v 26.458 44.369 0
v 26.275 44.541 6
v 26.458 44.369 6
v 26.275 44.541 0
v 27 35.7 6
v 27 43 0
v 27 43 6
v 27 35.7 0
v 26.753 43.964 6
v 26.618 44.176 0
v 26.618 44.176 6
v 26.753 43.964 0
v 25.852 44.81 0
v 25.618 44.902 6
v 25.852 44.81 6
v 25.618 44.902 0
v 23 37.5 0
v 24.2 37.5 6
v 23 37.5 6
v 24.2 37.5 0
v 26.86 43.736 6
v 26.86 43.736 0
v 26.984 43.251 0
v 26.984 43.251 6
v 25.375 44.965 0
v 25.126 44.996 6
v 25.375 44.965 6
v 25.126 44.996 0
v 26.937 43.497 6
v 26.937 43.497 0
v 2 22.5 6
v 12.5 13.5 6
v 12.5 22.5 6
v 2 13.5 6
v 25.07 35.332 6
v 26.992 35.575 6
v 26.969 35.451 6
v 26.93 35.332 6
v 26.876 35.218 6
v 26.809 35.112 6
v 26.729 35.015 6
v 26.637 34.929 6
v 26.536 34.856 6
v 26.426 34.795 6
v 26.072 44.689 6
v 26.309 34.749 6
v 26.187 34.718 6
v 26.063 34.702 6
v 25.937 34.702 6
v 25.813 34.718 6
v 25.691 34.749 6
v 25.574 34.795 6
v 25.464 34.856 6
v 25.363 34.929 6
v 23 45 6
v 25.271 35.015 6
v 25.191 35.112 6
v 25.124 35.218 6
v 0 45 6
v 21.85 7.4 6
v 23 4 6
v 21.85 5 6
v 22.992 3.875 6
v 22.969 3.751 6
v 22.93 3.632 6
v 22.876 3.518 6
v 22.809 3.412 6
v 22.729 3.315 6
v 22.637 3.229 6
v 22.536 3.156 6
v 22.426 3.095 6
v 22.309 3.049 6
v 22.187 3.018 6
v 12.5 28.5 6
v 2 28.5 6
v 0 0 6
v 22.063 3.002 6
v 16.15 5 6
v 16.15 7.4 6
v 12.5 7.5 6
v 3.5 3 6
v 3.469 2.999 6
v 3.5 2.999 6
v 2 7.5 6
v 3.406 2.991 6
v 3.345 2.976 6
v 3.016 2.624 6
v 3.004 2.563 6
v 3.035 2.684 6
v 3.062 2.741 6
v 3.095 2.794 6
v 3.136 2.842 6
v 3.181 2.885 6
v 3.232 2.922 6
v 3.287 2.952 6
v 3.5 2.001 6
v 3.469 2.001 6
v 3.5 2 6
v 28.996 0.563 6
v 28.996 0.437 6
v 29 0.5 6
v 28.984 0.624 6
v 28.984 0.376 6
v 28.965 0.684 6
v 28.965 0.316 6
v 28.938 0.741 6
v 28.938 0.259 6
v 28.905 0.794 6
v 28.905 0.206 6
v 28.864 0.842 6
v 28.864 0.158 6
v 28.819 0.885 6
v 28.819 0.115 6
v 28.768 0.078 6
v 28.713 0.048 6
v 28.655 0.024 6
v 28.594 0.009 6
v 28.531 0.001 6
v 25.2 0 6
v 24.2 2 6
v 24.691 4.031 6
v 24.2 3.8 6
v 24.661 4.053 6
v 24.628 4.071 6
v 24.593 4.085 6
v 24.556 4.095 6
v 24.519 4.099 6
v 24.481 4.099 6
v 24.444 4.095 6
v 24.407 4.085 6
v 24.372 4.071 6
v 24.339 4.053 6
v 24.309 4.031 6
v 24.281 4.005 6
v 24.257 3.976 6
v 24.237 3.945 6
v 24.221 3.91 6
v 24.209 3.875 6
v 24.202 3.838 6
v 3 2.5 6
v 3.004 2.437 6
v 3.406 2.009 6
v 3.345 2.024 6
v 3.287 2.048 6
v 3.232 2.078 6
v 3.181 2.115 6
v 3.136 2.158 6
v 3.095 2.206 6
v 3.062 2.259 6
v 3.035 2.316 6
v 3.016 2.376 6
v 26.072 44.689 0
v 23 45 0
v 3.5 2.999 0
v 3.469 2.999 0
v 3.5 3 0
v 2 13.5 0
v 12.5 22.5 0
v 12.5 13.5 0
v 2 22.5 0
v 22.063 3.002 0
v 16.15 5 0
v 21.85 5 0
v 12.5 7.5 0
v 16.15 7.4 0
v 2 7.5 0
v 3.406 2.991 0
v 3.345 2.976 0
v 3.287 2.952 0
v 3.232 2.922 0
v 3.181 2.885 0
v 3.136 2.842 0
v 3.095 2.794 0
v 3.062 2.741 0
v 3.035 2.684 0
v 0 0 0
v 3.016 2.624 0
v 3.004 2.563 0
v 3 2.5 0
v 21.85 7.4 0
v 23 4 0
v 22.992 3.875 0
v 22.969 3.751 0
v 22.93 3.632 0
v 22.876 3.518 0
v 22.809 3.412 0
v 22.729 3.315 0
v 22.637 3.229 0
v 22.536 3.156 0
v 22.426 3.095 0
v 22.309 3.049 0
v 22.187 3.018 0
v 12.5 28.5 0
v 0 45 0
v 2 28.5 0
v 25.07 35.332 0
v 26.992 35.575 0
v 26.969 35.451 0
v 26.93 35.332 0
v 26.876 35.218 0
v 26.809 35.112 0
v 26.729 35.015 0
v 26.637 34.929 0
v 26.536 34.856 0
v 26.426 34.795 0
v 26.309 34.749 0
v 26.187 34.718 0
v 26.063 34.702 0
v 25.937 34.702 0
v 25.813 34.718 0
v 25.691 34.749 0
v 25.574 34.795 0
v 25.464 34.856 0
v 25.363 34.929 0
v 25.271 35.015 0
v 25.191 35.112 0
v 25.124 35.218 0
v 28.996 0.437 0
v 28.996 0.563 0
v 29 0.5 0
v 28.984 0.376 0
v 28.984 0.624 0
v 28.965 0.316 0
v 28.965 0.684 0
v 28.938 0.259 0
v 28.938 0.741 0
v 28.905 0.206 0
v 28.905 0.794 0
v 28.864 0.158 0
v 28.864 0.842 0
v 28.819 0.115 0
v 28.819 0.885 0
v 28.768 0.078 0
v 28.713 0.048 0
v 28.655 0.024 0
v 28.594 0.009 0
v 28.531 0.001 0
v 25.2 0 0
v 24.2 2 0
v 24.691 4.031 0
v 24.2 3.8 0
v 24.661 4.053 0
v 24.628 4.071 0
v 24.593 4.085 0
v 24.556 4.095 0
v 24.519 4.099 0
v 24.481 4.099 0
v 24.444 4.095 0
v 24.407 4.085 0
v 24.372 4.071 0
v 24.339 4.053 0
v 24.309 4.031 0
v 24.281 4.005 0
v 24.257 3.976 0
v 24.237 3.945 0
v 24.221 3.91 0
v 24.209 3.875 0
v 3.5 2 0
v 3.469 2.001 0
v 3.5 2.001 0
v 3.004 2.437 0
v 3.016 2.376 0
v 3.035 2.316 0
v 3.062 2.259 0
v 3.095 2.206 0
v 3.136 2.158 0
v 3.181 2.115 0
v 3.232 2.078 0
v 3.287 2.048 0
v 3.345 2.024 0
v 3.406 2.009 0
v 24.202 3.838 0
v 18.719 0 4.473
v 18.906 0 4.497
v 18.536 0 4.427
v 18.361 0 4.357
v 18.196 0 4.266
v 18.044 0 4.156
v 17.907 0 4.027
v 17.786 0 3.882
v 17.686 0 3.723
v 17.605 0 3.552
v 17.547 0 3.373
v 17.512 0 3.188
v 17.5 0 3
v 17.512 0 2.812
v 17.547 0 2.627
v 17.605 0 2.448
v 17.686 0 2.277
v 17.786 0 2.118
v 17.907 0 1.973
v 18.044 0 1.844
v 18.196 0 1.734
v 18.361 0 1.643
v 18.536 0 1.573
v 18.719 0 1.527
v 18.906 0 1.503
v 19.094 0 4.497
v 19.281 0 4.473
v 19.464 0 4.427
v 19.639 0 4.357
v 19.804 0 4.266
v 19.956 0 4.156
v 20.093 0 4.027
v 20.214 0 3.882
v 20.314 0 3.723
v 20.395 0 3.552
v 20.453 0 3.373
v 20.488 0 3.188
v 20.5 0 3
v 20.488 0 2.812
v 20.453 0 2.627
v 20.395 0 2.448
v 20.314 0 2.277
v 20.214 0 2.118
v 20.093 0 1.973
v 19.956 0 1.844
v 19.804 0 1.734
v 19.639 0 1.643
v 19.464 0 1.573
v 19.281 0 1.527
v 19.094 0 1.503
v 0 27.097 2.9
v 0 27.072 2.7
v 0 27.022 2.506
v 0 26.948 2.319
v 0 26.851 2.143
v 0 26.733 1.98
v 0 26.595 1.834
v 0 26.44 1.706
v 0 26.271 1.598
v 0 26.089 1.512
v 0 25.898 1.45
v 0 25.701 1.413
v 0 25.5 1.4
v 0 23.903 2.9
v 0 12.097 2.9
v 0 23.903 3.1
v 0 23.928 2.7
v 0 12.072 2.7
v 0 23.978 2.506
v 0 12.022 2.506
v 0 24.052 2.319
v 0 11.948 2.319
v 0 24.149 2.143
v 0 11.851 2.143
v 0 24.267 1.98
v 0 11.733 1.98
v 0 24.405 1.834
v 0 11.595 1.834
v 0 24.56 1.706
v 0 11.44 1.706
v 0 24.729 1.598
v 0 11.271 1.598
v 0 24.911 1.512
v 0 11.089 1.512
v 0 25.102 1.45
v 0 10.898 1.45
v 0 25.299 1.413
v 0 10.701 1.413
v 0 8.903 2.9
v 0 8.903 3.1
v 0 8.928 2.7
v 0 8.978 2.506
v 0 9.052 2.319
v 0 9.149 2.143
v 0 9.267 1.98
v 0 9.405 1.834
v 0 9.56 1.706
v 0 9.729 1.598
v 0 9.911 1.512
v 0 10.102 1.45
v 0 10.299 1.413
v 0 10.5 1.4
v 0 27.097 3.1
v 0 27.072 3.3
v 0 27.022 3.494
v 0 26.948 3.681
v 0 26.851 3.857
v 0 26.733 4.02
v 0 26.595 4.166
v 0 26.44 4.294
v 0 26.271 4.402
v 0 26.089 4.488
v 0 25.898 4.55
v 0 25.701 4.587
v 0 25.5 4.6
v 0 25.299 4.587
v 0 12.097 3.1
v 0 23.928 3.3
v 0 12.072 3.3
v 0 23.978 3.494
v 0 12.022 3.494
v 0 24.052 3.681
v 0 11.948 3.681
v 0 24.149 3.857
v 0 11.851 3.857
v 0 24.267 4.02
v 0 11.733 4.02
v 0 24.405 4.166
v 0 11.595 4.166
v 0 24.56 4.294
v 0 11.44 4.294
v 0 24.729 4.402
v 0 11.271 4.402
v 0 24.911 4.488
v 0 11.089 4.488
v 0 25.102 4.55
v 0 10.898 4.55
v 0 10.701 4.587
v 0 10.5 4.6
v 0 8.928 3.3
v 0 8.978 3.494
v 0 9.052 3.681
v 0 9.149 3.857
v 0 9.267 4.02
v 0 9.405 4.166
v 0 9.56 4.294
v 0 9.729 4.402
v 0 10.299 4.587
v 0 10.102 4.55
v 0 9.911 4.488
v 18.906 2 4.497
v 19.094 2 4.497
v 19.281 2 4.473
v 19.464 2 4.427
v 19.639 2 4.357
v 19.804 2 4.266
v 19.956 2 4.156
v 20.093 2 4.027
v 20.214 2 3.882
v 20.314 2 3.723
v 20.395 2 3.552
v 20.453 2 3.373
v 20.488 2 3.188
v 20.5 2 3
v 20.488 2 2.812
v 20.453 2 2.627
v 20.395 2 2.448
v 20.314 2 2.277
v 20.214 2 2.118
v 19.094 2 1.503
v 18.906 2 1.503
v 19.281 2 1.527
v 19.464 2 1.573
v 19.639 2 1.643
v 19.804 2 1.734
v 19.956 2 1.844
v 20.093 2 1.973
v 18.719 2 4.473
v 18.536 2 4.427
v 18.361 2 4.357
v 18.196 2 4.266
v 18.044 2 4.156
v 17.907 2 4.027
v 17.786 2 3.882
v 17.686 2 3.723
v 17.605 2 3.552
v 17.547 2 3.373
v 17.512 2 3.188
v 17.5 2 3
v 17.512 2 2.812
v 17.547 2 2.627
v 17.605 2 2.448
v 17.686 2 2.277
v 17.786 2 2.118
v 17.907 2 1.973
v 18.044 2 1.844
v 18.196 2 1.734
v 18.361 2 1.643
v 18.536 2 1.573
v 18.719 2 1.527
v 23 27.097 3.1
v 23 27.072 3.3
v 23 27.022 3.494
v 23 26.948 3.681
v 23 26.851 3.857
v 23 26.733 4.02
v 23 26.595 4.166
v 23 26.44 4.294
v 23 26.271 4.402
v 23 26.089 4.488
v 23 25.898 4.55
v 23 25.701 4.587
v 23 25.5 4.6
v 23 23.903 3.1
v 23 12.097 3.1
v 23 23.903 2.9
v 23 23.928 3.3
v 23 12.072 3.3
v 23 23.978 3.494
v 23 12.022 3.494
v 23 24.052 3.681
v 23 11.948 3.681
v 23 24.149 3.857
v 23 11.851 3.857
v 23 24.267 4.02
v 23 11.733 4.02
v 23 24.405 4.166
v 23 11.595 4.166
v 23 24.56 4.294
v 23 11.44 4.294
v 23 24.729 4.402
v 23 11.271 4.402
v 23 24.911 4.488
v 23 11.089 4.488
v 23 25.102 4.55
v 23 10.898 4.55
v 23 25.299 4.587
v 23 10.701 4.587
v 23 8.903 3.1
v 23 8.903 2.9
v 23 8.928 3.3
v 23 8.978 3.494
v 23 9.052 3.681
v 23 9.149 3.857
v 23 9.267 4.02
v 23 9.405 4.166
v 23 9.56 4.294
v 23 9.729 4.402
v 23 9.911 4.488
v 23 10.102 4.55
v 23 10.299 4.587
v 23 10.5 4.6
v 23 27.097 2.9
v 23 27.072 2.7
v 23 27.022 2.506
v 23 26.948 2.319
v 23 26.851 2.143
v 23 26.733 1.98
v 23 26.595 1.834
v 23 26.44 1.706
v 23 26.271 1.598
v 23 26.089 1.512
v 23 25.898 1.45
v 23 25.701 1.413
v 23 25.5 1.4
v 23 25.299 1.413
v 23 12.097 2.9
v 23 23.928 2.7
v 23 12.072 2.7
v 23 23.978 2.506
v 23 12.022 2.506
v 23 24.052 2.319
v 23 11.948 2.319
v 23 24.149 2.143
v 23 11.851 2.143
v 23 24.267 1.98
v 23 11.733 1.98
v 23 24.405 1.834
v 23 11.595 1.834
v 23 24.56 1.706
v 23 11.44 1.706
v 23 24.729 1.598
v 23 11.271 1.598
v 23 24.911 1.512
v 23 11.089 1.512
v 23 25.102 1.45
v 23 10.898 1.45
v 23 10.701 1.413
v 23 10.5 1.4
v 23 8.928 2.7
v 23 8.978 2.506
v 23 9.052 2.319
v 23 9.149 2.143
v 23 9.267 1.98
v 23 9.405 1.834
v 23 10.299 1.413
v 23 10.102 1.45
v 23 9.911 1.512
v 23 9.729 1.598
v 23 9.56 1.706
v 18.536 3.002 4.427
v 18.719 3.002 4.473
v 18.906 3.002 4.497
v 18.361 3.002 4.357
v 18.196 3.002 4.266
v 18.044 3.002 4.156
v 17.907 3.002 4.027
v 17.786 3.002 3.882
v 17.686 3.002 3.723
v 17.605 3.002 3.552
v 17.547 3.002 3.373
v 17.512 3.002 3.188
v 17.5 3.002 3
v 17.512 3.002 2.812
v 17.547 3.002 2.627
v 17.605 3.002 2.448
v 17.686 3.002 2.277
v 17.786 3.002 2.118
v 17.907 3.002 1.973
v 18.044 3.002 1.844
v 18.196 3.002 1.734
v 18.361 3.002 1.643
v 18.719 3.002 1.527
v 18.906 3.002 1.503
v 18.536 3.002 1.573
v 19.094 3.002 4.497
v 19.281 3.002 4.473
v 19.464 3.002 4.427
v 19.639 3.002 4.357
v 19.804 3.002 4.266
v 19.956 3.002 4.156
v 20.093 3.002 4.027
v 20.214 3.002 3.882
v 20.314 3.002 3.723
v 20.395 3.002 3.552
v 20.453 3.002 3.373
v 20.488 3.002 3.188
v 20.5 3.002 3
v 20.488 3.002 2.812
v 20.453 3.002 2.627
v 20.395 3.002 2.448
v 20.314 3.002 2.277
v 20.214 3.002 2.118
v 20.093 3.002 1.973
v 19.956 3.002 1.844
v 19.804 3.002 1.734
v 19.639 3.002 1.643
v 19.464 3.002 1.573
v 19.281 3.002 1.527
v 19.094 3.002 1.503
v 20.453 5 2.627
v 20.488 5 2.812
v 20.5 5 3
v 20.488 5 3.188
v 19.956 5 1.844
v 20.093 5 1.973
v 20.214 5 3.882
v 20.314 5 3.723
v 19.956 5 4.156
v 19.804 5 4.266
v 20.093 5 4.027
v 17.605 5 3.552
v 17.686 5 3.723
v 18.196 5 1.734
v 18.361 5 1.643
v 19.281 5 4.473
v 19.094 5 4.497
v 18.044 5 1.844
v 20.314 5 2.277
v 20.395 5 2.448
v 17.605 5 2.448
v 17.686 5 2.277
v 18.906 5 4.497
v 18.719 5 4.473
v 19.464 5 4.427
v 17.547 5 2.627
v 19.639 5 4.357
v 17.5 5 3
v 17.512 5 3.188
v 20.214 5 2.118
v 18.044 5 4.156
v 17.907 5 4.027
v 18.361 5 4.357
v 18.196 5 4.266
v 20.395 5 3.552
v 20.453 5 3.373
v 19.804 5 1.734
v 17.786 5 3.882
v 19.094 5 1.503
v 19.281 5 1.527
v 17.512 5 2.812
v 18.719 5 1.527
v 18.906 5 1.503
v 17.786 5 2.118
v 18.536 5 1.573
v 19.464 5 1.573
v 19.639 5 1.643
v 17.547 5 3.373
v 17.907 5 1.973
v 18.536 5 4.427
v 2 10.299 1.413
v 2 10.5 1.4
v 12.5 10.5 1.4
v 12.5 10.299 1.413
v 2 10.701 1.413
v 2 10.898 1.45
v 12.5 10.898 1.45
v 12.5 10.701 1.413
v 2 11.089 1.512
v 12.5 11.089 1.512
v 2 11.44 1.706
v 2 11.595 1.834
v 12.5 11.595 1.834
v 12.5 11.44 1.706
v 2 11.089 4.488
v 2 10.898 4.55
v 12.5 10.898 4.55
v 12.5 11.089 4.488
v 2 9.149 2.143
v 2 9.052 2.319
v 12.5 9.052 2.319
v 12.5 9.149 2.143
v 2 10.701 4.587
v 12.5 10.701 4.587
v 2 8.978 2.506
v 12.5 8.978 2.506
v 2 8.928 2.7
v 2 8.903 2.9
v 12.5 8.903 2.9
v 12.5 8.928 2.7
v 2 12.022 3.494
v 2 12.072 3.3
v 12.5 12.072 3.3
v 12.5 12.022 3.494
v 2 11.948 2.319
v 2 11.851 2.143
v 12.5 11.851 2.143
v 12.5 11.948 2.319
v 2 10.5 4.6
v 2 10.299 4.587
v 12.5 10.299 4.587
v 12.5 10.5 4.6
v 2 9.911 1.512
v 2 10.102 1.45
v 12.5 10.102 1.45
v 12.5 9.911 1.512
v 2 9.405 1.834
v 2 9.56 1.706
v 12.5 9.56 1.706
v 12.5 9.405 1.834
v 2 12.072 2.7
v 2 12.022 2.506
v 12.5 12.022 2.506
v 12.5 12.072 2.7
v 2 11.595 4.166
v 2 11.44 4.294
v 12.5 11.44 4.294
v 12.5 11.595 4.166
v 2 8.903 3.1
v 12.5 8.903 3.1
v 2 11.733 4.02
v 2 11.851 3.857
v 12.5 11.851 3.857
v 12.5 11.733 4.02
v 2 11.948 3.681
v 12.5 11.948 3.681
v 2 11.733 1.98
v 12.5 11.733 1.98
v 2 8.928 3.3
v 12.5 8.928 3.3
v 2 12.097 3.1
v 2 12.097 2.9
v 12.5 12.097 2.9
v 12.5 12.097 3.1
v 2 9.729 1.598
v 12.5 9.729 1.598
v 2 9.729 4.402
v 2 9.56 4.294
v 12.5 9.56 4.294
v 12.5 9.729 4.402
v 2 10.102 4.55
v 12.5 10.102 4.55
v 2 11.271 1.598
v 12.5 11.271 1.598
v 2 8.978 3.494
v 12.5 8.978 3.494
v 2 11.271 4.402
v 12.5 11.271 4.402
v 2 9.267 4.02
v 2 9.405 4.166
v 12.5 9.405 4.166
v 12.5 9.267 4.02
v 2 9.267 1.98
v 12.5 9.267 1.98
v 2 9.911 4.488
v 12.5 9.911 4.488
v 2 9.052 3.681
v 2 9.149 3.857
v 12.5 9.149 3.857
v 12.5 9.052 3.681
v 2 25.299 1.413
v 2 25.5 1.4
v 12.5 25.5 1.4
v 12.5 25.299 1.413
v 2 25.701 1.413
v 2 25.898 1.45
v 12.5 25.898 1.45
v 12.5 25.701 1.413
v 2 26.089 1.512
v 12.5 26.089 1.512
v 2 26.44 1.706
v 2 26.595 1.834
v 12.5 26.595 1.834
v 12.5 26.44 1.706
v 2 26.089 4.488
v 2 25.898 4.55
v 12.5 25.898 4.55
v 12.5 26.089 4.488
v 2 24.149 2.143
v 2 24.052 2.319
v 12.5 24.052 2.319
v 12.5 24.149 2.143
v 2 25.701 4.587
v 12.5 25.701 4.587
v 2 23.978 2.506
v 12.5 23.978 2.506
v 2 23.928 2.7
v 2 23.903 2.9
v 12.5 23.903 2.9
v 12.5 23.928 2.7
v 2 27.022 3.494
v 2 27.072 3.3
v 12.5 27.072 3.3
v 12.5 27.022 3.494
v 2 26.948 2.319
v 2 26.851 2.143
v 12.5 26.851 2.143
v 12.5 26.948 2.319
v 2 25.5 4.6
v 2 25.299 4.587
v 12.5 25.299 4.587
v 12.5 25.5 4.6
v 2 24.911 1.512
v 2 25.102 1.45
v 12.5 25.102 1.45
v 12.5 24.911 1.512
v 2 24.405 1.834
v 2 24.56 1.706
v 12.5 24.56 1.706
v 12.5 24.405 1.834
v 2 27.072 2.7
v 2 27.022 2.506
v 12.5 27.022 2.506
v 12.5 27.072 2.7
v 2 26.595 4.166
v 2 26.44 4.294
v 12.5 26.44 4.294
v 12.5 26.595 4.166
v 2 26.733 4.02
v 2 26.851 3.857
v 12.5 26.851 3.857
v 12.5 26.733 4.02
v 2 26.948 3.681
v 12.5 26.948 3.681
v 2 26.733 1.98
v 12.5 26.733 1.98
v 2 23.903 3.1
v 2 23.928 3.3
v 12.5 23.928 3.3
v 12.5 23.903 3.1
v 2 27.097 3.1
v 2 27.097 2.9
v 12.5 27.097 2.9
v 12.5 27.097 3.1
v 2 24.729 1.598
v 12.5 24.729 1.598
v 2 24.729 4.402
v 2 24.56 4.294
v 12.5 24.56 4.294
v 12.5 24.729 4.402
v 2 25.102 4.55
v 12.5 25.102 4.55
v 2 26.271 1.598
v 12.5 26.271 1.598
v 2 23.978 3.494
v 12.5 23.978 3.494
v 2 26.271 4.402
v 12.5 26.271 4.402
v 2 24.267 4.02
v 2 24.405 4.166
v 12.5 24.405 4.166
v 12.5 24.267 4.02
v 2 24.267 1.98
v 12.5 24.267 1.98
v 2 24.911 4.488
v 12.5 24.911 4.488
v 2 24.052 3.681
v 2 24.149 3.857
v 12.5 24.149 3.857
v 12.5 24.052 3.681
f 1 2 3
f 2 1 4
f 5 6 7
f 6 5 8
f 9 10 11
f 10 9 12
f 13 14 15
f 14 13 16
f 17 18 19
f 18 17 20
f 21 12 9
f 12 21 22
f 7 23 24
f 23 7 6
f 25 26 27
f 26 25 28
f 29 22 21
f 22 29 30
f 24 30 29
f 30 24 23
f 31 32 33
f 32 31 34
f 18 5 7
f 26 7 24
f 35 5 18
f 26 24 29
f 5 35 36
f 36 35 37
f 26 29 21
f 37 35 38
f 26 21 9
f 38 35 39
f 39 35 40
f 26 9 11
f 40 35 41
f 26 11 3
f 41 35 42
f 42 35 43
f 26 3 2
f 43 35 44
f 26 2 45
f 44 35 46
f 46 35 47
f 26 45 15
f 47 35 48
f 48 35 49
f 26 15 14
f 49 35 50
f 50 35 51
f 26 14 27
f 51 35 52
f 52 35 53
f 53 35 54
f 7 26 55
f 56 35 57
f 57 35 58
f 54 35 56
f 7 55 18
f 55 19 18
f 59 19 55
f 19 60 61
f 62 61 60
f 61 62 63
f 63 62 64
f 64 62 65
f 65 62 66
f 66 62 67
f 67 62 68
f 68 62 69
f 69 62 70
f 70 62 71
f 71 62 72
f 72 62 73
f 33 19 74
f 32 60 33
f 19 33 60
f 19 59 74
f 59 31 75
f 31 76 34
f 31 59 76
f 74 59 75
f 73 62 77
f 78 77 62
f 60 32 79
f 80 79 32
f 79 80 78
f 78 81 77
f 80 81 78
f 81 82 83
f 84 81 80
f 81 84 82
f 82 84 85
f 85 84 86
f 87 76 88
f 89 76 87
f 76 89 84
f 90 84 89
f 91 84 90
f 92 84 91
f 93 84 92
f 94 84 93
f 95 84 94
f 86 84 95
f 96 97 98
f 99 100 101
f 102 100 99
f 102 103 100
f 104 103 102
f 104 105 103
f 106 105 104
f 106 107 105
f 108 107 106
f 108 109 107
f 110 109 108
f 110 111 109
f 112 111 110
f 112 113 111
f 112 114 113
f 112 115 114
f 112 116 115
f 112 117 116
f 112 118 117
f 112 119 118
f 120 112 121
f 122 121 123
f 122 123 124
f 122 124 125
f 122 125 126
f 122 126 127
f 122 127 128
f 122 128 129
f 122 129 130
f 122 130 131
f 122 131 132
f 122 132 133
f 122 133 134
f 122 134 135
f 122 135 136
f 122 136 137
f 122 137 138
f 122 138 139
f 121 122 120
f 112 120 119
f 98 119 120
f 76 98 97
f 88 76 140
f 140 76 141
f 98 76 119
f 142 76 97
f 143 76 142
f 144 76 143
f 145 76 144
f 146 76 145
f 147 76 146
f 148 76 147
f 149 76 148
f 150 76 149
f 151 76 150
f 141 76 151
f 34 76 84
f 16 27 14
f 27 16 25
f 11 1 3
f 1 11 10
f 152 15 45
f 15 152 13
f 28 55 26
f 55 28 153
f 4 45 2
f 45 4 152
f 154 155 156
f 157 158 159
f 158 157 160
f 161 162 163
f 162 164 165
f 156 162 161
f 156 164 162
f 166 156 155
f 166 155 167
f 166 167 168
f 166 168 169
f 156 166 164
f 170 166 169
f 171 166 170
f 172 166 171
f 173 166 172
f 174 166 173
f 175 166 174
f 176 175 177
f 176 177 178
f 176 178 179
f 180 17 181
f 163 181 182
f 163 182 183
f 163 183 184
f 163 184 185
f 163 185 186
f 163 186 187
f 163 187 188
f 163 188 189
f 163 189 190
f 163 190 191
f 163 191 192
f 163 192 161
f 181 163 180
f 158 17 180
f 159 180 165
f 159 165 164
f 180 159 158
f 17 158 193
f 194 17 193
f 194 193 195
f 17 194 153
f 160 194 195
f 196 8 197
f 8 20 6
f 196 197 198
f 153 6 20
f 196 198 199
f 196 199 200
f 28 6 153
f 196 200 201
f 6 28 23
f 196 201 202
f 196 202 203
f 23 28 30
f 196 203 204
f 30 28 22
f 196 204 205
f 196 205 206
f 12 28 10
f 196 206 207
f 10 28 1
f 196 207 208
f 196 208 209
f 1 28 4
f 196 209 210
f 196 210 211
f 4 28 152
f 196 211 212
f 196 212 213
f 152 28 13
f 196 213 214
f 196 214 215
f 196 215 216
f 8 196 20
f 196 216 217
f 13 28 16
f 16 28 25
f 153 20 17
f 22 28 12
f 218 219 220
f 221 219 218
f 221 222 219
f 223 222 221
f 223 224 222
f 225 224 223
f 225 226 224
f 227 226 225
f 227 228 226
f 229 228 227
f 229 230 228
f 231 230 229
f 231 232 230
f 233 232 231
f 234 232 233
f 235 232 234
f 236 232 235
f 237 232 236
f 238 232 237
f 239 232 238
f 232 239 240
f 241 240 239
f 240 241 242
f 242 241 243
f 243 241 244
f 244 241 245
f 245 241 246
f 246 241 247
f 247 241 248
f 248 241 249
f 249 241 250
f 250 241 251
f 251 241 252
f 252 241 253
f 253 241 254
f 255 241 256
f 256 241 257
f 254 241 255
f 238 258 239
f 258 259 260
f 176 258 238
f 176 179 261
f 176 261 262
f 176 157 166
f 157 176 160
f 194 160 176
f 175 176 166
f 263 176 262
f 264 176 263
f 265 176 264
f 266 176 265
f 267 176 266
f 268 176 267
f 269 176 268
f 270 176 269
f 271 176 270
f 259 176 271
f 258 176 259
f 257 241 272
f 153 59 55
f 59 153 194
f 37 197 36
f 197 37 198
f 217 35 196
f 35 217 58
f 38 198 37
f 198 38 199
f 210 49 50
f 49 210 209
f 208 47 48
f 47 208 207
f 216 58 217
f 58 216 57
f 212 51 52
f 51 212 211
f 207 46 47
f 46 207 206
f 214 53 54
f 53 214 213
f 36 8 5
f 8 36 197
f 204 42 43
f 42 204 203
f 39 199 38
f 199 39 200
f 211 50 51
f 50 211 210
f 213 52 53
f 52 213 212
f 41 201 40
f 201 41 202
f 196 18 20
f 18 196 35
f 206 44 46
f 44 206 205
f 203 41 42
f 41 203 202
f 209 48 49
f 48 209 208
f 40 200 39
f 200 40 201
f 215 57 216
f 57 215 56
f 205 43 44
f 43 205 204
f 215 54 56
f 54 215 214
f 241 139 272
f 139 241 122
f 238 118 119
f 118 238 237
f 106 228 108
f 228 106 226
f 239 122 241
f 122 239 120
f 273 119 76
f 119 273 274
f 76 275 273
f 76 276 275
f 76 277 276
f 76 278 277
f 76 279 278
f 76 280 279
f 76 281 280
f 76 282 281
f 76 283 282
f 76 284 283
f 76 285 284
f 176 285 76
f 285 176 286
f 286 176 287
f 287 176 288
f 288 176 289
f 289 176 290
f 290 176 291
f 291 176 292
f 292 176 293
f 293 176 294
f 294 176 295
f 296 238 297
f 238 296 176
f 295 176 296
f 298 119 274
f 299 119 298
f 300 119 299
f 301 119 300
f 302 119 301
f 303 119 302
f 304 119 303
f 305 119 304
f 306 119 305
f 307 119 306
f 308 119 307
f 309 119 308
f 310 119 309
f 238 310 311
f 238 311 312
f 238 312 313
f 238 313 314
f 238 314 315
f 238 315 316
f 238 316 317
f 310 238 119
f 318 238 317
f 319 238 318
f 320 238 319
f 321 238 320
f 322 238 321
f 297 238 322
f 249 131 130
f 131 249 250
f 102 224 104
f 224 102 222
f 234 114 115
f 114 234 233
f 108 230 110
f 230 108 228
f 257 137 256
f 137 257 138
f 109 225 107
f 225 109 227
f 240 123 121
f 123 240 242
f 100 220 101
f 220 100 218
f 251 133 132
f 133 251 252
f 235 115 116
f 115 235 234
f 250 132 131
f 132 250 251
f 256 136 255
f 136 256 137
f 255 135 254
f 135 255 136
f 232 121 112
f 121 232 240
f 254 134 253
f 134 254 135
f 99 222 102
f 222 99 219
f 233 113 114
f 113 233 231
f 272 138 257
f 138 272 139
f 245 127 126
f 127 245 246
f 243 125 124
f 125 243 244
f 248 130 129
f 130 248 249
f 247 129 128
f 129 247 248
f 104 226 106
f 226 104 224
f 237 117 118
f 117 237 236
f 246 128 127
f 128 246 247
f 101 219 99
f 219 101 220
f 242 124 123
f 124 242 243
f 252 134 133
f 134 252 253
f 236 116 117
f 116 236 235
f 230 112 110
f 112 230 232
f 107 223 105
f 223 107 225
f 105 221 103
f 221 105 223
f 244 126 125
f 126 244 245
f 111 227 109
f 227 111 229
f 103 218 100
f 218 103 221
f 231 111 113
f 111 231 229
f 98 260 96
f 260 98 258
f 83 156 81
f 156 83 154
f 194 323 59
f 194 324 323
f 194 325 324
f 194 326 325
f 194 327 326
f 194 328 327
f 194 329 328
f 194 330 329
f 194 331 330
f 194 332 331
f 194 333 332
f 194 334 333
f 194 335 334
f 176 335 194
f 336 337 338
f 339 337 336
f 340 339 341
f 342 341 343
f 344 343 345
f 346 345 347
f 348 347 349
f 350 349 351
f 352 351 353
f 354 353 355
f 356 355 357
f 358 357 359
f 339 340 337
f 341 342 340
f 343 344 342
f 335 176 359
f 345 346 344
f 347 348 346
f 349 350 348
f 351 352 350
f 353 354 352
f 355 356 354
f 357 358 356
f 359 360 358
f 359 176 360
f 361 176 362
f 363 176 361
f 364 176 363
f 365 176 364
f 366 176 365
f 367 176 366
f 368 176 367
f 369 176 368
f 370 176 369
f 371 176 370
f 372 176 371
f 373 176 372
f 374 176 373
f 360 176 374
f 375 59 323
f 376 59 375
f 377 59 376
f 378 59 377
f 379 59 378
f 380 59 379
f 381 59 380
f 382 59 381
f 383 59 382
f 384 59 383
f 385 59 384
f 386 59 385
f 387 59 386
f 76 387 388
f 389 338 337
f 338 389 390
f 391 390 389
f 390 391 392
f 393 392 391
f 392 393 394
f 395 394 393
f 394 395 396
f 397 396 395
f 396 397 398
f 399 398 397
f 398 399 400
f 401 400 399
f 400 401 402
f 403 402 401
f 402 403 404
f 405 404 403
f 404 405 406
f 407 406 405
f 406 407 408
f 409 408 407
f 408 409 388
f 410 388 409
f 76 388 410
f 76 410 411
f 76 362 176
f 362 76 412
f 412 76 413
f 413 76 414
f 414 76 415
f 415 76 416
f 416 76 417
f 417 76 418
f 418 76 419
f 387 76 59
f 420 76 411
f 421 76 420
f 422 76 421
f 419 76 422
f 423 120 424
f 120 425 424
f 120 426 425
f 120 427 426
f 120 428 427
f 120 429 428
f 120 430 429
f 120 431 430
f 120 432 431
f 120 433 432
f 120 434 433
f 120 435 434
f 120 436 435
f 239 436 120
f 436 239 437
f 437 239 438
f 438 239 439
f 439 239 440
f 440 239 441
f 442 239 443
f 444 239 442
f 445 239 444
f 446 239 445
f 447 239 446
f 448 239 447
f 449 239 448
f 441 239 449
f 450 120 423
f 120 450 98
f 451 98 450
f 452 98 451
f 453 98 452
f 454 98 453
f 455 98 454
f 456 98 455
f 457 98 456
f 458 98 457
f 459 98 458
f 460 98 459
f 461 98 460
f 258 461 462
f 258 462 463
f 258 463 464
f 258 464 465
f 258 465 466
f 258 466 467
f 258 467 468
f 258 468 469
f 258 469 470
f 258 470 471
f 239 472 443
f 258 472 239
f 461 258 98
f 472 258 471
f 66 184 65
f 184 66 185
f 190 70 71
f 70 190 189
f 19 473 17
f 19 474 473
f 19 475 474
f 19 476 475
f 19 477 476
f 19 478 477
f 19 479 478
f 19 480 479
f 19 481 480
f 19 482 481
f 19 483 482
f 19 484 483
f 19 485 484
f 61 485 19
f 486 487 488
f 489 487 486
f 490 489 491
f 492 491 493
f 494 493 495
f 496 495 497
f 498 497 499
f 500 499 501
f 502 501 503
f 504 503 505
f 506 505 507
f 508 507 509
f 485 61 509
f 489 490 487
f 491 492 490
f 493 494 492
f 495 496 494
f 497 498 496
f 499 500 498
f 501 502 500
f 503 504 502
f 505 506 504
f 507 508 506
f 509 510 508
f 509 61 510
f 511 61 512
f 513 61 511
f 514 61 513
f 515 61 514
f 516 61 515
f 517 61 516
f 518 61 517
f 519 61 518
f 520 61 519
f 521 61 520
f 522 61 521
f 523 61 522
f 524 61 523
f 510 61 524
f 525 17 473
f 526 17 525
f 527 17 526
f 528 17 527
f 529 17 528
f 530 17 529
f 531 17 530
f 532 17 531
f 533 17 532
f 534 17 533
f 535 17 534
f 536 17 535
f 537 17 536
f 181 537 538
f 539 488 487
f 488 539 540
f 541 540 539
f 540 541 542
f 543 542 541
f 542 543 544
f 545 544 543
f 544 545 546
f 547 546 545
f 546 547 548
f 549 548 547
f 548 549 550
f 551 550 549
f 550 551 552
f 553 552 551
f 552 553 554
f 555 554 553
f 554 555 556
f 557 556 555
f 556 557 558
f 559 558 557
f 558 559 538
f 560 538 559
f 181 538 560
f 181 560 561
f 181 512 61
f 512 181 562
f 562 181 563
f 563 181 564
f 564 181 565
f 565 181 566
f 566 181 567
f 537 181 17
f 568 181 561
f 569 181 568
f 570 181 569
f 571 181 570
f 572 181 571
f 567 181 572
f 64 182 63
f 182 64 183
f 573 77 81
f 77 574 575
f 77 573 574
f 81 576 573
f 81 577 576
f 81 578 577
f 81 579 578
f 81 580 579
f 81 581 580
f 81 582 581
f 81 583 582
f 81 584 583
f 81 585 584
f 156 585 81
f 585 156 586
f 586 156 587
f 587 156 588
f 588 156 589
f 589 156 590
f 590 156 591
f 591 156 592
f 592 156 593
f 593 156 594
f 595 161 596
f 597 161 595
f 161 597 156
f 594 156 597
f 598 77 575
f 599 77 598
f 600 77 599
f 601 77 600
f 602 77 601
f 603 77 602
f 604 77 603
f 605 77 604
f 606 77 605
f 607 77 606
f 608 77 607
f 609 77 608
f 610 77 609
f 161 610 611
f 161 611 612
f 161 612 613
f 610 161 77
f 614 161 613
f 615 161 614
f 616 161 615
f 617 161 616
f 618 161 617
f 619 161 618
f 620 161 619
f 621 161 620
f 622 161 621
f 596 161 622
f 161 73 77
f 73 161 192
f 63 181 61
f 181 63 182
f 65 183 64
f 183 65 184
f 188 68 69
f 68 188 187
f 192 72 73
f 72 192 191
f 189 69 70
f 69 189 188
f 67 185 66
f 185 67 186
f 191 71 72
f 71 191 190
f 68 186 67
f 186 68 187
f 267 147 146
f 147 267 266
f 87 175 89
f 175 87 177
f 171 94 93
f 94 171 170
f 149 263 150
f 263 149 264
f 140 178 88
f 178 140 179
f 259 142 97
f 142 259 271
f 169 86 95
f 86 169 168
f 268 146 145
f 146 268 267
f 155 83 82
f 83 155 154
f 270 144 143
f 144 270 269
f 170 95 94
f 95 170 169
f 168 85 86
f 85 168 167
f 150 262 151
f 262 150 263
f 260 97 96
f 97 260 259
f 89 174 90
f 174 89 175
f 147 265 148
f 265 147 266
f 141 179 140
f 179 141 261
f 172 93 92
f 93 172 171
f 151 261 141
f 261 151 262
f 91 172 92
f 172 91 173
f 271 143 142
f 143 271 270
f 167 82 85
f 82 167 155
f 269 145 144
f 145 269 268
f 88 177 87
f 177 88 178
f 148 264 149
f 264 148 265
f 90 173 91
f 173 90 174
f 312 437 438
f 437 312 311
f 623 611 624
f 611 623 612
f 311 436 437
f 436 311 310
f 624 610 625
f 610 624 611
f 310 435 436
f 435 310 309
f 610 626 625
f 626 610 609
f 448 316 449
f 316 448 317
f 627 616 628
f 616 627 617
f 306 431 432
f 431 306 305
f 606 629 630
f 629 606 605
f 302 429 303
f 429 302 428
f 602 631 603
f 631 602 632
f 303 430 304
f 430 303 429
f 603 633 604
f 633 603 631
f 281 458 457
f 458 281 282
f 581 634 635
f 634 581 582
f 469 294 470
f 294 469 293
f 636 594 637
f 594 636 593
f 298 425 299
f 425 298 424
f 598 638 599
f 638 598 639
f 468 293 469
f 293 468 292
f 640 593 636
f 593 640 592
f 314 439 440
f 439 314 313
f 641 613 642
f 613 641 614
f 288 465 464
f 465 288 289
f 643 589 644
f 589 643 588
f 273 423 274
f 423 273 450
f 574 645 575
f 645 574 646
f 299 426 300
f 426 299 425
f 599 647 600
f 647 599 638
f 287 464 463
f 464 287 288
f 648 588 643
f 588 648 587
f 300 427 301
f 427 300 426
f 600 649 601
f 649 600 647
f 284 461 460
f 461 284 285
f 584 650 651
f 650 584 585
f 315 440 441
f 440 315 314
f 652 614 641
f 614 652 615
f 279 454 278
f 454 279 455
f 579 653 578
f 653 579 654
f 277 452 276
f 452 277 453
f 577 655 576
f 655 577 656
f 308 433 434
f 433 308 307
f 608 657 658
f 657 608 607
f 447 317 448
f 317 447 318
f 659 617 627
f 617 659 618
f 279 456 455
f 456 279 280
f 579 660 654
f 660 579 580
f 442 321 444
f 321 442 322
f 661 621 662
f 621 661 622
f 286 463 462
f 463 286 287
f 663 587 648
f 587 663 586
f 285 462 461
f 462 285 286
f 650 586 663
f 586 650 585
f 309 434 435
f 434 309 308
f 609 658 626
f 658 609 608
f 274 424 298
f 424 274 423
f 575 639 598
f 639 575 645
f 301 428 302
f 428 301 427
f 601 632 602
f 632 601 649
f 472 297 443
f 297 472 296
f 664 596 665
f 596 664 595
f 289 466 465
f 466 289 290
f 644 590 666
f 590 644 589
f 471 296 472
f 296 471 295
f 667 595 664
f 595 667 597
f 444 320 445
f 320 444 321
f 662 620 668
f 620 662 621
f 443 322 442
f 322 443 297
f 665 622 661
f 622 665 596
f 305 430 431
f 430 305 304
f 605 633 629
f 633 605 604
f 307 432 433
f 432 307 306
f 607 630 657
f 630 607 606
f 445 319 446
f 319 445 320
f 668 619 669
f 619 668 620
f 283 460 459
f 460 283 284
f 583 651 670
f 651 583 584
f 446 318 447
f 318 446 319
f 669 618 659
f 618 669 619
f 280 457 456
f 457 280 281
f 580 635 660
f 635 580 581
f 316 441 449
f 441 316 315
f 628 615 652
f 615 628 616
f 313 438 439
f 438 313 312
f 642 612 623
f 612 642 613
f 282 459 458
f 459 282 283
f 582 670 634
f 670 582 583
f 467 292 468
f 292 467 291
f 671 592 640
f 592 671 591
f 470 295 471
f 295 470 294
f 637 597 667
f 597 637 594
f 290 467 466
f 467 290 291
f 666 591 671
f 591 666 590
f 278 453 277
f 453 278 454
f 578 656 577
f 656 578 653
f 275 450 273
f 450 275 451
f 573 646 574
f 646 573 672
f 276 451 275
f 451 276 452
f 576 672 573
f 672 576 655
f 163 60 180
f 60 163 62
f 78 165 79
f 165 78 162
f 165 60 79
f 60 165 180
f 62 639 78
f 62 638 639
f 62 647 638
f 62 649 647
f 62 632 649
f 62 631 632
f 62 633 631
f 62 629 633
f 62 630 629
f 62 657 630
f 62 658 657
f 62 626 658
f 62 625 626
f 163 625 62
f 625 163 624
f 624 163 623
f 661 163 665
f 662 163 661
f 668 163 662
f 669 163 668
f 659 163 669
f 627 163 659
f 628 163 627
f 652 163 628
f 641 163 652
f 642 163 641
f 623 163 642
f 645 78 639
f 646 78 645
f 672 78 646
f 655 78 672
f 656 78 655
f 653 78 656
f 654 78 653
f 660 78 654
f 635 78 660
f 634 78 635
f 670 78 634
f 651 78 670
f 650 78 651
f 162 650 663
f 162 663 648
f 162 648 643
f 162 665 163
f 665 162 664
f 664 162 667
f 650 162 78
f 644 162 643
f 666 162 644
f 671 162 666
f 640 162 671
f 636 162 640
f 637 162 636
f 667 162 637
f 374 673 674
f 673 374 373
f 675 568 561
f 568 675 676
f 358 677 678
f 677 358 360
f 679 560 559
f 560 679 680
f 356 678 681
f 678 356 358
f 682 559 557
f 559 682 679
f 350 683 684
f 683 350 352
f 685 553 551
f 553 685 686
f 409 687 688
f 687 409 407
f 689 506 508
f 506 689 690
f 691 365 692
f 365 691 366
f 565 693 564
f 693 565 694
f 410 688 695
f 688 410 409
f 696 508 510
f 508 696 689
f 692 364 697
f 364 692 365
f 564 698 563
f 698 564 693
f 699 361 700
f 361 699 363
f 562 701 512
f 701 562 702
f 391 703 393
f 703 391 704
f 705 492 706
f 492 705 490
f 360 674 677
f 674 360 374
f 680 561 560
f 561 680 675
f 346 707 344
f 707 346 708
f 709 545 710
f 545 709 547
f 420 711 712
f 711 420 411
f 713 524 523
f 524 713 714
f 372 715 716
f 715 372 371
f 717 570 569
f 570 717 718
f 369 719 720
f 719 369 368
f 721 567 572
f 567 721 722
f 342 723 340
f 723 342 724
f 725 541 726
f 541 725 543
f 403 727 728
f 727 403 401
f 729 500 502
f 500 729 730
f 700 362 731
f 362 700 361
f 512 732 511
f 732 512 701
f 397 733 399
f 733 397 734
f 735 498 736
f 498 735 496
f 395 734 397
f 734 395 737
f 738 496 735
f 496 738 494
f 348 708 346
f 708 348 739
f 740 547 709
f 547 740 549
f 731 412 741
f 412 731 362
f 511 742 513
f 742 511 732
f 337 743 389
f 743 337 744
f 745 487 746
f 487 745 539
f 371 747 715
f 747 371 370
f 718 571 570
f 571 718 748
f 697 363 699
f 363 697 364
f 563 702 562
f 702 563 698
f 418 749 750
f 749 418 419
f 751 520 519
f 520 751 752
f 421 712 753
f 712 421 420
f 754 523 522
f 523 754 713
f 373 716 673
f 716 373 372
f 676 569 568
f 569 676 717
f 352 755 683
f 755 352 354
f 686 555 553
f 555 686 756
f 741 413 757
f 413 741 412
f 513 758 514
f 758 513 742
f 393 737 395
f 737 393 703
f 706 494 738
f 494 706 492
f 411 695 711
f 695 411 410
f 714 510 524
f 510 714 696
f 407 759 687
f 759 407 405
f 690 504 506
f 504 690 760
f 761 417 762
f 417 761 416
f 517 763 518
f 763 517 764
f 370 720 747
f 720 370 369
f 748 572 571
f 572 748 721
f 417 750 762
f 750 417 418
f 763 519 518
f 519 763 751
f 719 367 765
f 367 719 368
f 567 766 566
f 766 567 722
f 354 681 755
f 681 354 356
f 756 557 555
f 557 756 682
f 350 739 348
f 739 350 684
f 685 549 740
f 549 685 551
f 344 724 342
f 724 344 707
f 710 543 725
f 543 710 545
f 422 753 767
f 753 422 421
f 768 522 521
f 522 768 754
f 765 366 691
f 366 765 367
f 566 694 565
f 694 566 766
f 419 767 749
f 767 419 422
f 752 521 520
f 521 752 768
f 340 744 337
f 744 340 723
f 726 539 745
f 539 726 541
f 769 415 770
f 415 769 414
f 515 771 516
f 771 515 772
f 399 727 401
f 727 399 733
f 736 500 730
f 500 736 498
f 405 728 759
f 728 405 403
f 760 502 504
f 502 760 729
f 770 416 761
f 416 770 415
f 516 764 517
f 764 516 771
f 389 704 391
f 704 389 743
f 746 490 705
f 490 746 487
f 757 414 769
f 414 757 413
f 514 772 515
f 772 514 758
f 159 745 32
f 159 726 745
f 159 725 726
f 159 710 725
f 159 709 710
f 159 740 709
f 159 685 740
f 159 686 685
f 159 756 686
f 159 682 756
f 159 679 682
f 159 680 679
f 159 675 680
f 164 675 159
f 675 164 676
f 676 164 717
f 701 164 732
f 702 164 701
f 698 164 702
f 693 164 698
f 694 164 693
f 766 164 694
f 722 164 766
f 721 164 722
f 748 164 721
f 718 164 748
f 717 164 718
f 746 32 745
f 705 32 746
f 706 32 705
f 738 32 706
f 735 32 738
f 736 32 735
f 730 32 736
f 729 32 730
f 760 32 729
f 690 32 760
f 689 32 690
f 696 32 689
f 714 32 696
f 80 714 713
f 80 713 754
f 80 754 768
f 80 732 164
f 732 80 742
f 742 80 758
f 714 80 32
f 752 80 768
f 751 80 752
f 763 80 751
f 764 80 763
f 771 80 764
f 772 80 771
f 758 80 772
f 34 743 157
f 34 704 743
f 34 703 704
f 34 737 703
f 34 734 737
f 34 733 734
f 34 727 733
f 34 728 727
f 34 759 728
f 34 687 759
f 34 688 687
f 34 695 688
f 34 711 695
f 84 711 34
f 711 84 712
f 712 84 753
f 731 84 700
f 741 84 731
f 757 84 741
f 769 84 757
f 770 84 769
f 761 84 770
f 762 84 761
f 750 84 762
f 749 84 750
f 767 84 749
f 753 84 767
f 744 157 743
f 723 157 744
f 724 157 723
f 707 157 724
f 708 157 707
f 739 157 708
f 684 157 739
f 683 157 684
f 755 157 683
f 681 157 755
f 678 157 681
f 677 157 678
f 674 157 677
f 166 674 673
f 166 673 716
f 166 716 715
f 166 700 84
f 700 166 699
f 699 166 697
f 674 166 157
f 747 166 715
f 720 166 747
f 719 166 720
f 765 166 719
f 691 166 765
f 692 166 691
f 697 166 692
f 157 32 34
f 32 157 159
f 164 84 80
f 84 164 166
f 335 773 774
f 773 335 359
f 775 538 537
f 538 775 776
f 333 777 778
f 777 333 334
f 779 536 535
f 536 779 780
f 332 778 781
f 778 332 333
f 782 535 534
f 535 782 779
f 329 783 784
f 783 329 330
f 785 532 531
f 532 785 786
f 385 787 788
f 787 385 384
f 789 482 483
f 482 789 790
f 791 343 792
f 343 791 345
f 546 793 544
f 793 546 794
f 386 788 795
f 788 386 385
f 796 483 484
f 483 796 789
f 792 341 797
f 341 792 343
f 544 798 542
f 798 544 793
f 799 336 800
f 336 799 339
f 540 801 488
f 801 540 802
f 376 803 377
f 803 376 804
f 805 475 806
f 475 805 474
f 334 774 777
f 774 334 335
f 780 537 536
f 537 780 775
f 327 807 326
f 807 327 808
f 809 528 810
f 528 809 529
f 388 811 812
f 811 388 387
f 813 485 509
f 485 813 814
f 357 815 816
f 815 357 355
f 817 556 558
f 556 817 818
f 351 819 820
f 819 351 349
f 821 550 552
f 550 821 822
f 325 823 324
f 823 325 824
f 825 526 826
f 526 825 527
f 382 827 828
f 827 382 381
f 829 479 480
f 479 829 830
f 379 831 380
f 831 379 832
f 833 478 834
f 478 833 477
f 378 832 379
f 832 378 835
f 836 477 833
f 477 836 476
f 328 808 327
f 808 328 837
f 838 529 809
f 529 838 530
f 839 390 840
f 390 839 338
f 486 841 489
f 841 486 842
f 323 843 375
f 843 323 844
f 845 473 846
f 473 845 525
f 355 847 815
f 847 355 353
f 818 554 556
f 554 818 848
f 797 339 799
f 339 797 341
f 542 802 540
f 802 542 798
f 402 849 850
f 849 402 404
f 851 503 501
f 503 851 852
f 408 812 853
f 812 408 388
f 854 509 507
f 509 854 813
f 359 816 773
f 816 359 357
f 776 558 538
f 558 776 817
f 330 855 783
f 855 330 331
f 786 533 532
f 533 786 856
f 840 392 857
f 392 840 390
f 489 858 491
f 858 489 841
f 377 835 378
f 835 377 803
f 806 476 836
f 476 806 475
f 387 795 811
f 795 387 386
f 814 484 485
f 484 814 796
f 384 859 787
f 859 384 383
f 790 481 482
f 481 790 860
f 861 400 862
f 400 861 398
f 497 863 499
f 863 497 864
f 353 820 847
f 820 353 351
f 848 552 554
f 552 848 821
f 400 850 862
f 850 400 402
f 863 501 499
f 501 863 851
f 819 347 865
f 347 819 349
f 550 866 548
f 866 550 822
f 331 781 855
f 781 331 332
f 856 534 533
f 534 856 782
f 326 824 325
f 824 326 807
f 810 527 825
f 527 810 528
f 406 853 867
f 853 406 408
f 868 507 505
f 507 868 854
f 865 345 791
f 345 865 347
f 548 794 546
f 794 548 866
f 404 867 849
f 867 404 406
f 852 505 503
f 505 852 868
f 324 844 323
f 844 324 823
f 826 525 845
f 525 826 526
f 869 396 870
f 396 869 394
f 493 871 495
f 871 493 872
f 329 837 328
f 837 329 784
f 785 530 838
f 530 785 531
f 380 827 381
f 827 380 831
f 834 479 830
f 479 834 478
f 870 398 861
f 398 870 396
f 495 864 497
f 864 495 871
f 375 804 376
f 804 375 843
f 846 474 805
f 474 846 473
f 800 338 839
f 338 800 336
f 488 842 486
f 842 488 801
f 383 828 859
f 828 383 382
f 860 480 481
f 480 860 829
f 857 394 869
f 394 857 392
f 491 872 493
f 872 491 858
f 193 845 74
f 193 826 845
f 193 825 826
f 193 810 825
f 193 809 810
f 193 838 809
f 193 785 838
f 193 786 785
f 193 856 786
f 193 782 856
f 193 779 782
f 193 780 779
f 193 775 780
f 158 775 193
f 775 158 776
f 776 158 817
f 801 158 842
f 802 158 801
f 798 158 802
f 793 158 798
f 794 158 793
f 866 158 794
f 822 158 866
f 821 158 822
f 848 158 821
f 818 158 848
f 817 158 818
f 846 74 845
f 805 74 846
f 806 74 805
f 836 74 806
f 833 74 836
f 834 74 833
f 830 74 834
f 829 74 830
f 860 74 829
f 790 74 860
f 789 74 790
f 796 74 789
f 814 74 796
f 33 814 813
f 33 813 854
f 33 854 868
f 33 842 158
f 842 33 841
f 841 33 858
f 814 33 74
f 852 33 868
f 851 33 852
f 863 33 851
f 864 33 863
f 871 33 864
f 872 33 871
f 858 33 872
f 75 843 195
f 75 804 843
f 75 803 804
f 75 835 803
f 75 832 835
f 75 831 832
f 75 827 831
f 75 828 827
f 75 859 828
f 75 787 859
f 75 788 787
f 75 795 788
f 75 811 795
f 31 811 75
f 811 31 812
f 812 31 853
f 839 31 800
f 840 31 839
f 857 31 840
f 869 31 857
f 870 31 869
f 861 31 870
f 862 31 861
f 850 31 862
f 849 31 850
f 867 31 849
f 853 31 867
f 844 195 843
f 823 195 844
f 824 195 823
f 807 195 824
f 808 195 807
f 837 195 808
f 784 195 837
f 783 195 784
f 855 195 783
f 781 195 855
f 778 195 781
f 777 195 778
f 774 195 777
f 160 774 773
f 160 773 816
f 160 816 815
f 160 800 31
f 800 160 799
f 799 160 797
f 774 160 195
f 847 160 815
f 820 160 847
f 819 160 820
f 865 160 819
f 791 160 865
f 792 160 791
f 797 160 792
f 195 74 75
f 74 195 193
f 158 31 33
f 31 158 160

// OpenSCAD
//-------------------------------------------------------------------
// title: DIN clip
// author: OK1HRA 
// license: Creative Commons BY-SA
// URL: http://remoteqth.com/3d-din-rail-mount-clip.php
// Original revision: 0.1
// revision: 0.2b Contributed by John Cabrer
// format: OpenSCAD
//-------------------------------------------------------------------
// HowTo:
// Determine the center to center hole spacing of the device to mount (mount_hole_spacing)
// Pick a metric screw size, and length
// Pick a nut width and height
// See http://mcmaster-carr.com/ for drawings of all screws and nuts.
// The mount post length is calculated based on the screw length
// After after making your changes, press F5 to re-render them to the screen
// .STL export press F6 and menu /Design/Export as STL...

// ----- Inside Hole Calibration Values --------
// To use, print out a part with default values (i.e. mount_nut_width = 8,
// actual_measurement = 8)
// Measure the resulting hole width of the nut, and type that value as the actual measurement. Render and export. Print again.
// The gain_adjust value will insure that holes measure as they should.

expected_measurement = 8;
actual_measurement = 8;
gain_adjust = expected_measurement / actual_measurement; // Default = 8/8 = 1

//----------------- Mounting Screw Input Parameters ---------------------------------
plate_thickness = 1.65;    // This is the thickness of the thing being mounted
mount_hole_spacing = 15;    // mount_hole_spacing between mounting holes. 31mm for LCD1602. 50?mm for relay module
mount_screw_length = 14; // Min = 6
mount_screw_thread_diameter = 3.2;    // Min = 1, Max = 6
mount_nut_width = 6;   // Max = 10
mount_nut_height = 10.5;   // Max = 5

//----------------- Mounting Srew Input Parameters, Default is M3x8 ---------------------------------
lock_screw_length = 5; 
lock_screw_thread_diameter = 3 * gain_adjust;
lock_nut_width = 5.5 * gain_adjust;
lock_nut_height = 2.4 * gain_adjust;

//----------------- Calculated Parameters
standoff_length = mount_screw_length - (mount_nut_height * gain_adjust) - plate_thickness - 2;
$fn=50;
width = 6; 
r_mount_screw = (mount_screw_thread_diameter * gain_adjust) / 2;      // Radius of the mounting screw threads
r_lock_screw = (lock_screw_thread_diameter * gain_adjust) / 2;
expand = 10;      // 0-x
long = 45;

din();

module din(){
	difference() {
		union() {
			hull() {
				translate([15+expand,long-2,0]) {
                    cylinder(h=width, r=2, center=false);}

                translate([12+expand,37.5,0]) {
                    cube([5,1,width], center=false);}

                translate([12+expand,long-1,0]) {
                    cube([1,1,width], center=false);}
            }

			hull() {
				translate([16+expand,35.7,0]) {
                    cylinder(h=width, r=1, center=false);}

                translate([14.2+expand,37.5,0]) {
                    cube([2.8,1,width], center=false);}
            }

			hull() {
				translate([18.5+expand,0.5,0]) {
                    cylinder(h=width, r=0.5, center=false);}
				translate([14.5+expand,3.8,0]) {
                    cylinder(h=width, r=0.3, center=false);}
				translate([14.2+expand,0,0]) {
                    cube([1,1,width], center=false);}
			}

			cube([3.5,4,width], center=false);
            cube([15+expand,2,width], center=false);

			hull() {
				translate([12+expand,4,0]) {
                    cylinder(h=width, r=1, center=false);}

                translate([0,3,0]) {
                    cube([1,1,width], center=false);}

                translate([0,long-1,0]) {
                    cube([13+expand,1,width], center=false);}
            }

			hull() {
            translate([0,40,0]) {
                cube([14,1,width], center=false);}

            translate([2,mount_hole_spacing+14,0]) {
                cylinder(h=width, r=2, center=false);}

            translate([6,mount_hole_spacing+14,0]) {
                cylinder(h=width, r=2, center=false);}
            }

            translate([-standoff_length,10.5-3.5,0]) {
                cube([standoff_length+1,7,width], center=false);}

            translate([-standoff_length,10.5-3.5+mount_hole_spacing,0]) {
                cube([standoff_length+1,7,width], center=false);}
        }
        // Clip fillet
        translate([3.5,2.5,-1]) {
            cylinder(h=width+2, r=0.5, center=false);}
        
        // Lock Screw and Nut
        translate([9+expand,-1,width/2]) rotate([-90,0,0]){
            cylinder(h=lock_screw_length+3, r=r_lock_screw, center=false);}

		translate([6.15+expand,5,-1]) {
            cube([5.7,lock_nut_height,width+2], center=false);}

        // 1. mount
        translate([-1-standoff_length,10.5,width/2]) rotate([0,90,0]){
            cylinder(h=standoff_length+48, r=r_mount_screw, center=false);}

		translate([2,7.65 - (((mount_nut_width * gain_adjust) - 5.7) / 2),-1]) {
            cube([mount_nut_height * gain_adjust,mount_nut_width * gain_adjust,width+2], center=false);}

        // 2. mount
        translate([-1-standoff_length,10.5+mount_hole_spacing,width/2]) rotate([0,90,0]){
            cylinder(h=standoff_length+48, r=r_mount_screw, center=false);}

		translate([2,7.65 - (((mount_nut_width * gain_adjust) - 5.7) / 2)+mount_hole_spacing,-1]) {
            cube([mount_nut_height * gain_adjust,mount_nut_width * gain_adjust,width+2], center=false);}
    }
}
